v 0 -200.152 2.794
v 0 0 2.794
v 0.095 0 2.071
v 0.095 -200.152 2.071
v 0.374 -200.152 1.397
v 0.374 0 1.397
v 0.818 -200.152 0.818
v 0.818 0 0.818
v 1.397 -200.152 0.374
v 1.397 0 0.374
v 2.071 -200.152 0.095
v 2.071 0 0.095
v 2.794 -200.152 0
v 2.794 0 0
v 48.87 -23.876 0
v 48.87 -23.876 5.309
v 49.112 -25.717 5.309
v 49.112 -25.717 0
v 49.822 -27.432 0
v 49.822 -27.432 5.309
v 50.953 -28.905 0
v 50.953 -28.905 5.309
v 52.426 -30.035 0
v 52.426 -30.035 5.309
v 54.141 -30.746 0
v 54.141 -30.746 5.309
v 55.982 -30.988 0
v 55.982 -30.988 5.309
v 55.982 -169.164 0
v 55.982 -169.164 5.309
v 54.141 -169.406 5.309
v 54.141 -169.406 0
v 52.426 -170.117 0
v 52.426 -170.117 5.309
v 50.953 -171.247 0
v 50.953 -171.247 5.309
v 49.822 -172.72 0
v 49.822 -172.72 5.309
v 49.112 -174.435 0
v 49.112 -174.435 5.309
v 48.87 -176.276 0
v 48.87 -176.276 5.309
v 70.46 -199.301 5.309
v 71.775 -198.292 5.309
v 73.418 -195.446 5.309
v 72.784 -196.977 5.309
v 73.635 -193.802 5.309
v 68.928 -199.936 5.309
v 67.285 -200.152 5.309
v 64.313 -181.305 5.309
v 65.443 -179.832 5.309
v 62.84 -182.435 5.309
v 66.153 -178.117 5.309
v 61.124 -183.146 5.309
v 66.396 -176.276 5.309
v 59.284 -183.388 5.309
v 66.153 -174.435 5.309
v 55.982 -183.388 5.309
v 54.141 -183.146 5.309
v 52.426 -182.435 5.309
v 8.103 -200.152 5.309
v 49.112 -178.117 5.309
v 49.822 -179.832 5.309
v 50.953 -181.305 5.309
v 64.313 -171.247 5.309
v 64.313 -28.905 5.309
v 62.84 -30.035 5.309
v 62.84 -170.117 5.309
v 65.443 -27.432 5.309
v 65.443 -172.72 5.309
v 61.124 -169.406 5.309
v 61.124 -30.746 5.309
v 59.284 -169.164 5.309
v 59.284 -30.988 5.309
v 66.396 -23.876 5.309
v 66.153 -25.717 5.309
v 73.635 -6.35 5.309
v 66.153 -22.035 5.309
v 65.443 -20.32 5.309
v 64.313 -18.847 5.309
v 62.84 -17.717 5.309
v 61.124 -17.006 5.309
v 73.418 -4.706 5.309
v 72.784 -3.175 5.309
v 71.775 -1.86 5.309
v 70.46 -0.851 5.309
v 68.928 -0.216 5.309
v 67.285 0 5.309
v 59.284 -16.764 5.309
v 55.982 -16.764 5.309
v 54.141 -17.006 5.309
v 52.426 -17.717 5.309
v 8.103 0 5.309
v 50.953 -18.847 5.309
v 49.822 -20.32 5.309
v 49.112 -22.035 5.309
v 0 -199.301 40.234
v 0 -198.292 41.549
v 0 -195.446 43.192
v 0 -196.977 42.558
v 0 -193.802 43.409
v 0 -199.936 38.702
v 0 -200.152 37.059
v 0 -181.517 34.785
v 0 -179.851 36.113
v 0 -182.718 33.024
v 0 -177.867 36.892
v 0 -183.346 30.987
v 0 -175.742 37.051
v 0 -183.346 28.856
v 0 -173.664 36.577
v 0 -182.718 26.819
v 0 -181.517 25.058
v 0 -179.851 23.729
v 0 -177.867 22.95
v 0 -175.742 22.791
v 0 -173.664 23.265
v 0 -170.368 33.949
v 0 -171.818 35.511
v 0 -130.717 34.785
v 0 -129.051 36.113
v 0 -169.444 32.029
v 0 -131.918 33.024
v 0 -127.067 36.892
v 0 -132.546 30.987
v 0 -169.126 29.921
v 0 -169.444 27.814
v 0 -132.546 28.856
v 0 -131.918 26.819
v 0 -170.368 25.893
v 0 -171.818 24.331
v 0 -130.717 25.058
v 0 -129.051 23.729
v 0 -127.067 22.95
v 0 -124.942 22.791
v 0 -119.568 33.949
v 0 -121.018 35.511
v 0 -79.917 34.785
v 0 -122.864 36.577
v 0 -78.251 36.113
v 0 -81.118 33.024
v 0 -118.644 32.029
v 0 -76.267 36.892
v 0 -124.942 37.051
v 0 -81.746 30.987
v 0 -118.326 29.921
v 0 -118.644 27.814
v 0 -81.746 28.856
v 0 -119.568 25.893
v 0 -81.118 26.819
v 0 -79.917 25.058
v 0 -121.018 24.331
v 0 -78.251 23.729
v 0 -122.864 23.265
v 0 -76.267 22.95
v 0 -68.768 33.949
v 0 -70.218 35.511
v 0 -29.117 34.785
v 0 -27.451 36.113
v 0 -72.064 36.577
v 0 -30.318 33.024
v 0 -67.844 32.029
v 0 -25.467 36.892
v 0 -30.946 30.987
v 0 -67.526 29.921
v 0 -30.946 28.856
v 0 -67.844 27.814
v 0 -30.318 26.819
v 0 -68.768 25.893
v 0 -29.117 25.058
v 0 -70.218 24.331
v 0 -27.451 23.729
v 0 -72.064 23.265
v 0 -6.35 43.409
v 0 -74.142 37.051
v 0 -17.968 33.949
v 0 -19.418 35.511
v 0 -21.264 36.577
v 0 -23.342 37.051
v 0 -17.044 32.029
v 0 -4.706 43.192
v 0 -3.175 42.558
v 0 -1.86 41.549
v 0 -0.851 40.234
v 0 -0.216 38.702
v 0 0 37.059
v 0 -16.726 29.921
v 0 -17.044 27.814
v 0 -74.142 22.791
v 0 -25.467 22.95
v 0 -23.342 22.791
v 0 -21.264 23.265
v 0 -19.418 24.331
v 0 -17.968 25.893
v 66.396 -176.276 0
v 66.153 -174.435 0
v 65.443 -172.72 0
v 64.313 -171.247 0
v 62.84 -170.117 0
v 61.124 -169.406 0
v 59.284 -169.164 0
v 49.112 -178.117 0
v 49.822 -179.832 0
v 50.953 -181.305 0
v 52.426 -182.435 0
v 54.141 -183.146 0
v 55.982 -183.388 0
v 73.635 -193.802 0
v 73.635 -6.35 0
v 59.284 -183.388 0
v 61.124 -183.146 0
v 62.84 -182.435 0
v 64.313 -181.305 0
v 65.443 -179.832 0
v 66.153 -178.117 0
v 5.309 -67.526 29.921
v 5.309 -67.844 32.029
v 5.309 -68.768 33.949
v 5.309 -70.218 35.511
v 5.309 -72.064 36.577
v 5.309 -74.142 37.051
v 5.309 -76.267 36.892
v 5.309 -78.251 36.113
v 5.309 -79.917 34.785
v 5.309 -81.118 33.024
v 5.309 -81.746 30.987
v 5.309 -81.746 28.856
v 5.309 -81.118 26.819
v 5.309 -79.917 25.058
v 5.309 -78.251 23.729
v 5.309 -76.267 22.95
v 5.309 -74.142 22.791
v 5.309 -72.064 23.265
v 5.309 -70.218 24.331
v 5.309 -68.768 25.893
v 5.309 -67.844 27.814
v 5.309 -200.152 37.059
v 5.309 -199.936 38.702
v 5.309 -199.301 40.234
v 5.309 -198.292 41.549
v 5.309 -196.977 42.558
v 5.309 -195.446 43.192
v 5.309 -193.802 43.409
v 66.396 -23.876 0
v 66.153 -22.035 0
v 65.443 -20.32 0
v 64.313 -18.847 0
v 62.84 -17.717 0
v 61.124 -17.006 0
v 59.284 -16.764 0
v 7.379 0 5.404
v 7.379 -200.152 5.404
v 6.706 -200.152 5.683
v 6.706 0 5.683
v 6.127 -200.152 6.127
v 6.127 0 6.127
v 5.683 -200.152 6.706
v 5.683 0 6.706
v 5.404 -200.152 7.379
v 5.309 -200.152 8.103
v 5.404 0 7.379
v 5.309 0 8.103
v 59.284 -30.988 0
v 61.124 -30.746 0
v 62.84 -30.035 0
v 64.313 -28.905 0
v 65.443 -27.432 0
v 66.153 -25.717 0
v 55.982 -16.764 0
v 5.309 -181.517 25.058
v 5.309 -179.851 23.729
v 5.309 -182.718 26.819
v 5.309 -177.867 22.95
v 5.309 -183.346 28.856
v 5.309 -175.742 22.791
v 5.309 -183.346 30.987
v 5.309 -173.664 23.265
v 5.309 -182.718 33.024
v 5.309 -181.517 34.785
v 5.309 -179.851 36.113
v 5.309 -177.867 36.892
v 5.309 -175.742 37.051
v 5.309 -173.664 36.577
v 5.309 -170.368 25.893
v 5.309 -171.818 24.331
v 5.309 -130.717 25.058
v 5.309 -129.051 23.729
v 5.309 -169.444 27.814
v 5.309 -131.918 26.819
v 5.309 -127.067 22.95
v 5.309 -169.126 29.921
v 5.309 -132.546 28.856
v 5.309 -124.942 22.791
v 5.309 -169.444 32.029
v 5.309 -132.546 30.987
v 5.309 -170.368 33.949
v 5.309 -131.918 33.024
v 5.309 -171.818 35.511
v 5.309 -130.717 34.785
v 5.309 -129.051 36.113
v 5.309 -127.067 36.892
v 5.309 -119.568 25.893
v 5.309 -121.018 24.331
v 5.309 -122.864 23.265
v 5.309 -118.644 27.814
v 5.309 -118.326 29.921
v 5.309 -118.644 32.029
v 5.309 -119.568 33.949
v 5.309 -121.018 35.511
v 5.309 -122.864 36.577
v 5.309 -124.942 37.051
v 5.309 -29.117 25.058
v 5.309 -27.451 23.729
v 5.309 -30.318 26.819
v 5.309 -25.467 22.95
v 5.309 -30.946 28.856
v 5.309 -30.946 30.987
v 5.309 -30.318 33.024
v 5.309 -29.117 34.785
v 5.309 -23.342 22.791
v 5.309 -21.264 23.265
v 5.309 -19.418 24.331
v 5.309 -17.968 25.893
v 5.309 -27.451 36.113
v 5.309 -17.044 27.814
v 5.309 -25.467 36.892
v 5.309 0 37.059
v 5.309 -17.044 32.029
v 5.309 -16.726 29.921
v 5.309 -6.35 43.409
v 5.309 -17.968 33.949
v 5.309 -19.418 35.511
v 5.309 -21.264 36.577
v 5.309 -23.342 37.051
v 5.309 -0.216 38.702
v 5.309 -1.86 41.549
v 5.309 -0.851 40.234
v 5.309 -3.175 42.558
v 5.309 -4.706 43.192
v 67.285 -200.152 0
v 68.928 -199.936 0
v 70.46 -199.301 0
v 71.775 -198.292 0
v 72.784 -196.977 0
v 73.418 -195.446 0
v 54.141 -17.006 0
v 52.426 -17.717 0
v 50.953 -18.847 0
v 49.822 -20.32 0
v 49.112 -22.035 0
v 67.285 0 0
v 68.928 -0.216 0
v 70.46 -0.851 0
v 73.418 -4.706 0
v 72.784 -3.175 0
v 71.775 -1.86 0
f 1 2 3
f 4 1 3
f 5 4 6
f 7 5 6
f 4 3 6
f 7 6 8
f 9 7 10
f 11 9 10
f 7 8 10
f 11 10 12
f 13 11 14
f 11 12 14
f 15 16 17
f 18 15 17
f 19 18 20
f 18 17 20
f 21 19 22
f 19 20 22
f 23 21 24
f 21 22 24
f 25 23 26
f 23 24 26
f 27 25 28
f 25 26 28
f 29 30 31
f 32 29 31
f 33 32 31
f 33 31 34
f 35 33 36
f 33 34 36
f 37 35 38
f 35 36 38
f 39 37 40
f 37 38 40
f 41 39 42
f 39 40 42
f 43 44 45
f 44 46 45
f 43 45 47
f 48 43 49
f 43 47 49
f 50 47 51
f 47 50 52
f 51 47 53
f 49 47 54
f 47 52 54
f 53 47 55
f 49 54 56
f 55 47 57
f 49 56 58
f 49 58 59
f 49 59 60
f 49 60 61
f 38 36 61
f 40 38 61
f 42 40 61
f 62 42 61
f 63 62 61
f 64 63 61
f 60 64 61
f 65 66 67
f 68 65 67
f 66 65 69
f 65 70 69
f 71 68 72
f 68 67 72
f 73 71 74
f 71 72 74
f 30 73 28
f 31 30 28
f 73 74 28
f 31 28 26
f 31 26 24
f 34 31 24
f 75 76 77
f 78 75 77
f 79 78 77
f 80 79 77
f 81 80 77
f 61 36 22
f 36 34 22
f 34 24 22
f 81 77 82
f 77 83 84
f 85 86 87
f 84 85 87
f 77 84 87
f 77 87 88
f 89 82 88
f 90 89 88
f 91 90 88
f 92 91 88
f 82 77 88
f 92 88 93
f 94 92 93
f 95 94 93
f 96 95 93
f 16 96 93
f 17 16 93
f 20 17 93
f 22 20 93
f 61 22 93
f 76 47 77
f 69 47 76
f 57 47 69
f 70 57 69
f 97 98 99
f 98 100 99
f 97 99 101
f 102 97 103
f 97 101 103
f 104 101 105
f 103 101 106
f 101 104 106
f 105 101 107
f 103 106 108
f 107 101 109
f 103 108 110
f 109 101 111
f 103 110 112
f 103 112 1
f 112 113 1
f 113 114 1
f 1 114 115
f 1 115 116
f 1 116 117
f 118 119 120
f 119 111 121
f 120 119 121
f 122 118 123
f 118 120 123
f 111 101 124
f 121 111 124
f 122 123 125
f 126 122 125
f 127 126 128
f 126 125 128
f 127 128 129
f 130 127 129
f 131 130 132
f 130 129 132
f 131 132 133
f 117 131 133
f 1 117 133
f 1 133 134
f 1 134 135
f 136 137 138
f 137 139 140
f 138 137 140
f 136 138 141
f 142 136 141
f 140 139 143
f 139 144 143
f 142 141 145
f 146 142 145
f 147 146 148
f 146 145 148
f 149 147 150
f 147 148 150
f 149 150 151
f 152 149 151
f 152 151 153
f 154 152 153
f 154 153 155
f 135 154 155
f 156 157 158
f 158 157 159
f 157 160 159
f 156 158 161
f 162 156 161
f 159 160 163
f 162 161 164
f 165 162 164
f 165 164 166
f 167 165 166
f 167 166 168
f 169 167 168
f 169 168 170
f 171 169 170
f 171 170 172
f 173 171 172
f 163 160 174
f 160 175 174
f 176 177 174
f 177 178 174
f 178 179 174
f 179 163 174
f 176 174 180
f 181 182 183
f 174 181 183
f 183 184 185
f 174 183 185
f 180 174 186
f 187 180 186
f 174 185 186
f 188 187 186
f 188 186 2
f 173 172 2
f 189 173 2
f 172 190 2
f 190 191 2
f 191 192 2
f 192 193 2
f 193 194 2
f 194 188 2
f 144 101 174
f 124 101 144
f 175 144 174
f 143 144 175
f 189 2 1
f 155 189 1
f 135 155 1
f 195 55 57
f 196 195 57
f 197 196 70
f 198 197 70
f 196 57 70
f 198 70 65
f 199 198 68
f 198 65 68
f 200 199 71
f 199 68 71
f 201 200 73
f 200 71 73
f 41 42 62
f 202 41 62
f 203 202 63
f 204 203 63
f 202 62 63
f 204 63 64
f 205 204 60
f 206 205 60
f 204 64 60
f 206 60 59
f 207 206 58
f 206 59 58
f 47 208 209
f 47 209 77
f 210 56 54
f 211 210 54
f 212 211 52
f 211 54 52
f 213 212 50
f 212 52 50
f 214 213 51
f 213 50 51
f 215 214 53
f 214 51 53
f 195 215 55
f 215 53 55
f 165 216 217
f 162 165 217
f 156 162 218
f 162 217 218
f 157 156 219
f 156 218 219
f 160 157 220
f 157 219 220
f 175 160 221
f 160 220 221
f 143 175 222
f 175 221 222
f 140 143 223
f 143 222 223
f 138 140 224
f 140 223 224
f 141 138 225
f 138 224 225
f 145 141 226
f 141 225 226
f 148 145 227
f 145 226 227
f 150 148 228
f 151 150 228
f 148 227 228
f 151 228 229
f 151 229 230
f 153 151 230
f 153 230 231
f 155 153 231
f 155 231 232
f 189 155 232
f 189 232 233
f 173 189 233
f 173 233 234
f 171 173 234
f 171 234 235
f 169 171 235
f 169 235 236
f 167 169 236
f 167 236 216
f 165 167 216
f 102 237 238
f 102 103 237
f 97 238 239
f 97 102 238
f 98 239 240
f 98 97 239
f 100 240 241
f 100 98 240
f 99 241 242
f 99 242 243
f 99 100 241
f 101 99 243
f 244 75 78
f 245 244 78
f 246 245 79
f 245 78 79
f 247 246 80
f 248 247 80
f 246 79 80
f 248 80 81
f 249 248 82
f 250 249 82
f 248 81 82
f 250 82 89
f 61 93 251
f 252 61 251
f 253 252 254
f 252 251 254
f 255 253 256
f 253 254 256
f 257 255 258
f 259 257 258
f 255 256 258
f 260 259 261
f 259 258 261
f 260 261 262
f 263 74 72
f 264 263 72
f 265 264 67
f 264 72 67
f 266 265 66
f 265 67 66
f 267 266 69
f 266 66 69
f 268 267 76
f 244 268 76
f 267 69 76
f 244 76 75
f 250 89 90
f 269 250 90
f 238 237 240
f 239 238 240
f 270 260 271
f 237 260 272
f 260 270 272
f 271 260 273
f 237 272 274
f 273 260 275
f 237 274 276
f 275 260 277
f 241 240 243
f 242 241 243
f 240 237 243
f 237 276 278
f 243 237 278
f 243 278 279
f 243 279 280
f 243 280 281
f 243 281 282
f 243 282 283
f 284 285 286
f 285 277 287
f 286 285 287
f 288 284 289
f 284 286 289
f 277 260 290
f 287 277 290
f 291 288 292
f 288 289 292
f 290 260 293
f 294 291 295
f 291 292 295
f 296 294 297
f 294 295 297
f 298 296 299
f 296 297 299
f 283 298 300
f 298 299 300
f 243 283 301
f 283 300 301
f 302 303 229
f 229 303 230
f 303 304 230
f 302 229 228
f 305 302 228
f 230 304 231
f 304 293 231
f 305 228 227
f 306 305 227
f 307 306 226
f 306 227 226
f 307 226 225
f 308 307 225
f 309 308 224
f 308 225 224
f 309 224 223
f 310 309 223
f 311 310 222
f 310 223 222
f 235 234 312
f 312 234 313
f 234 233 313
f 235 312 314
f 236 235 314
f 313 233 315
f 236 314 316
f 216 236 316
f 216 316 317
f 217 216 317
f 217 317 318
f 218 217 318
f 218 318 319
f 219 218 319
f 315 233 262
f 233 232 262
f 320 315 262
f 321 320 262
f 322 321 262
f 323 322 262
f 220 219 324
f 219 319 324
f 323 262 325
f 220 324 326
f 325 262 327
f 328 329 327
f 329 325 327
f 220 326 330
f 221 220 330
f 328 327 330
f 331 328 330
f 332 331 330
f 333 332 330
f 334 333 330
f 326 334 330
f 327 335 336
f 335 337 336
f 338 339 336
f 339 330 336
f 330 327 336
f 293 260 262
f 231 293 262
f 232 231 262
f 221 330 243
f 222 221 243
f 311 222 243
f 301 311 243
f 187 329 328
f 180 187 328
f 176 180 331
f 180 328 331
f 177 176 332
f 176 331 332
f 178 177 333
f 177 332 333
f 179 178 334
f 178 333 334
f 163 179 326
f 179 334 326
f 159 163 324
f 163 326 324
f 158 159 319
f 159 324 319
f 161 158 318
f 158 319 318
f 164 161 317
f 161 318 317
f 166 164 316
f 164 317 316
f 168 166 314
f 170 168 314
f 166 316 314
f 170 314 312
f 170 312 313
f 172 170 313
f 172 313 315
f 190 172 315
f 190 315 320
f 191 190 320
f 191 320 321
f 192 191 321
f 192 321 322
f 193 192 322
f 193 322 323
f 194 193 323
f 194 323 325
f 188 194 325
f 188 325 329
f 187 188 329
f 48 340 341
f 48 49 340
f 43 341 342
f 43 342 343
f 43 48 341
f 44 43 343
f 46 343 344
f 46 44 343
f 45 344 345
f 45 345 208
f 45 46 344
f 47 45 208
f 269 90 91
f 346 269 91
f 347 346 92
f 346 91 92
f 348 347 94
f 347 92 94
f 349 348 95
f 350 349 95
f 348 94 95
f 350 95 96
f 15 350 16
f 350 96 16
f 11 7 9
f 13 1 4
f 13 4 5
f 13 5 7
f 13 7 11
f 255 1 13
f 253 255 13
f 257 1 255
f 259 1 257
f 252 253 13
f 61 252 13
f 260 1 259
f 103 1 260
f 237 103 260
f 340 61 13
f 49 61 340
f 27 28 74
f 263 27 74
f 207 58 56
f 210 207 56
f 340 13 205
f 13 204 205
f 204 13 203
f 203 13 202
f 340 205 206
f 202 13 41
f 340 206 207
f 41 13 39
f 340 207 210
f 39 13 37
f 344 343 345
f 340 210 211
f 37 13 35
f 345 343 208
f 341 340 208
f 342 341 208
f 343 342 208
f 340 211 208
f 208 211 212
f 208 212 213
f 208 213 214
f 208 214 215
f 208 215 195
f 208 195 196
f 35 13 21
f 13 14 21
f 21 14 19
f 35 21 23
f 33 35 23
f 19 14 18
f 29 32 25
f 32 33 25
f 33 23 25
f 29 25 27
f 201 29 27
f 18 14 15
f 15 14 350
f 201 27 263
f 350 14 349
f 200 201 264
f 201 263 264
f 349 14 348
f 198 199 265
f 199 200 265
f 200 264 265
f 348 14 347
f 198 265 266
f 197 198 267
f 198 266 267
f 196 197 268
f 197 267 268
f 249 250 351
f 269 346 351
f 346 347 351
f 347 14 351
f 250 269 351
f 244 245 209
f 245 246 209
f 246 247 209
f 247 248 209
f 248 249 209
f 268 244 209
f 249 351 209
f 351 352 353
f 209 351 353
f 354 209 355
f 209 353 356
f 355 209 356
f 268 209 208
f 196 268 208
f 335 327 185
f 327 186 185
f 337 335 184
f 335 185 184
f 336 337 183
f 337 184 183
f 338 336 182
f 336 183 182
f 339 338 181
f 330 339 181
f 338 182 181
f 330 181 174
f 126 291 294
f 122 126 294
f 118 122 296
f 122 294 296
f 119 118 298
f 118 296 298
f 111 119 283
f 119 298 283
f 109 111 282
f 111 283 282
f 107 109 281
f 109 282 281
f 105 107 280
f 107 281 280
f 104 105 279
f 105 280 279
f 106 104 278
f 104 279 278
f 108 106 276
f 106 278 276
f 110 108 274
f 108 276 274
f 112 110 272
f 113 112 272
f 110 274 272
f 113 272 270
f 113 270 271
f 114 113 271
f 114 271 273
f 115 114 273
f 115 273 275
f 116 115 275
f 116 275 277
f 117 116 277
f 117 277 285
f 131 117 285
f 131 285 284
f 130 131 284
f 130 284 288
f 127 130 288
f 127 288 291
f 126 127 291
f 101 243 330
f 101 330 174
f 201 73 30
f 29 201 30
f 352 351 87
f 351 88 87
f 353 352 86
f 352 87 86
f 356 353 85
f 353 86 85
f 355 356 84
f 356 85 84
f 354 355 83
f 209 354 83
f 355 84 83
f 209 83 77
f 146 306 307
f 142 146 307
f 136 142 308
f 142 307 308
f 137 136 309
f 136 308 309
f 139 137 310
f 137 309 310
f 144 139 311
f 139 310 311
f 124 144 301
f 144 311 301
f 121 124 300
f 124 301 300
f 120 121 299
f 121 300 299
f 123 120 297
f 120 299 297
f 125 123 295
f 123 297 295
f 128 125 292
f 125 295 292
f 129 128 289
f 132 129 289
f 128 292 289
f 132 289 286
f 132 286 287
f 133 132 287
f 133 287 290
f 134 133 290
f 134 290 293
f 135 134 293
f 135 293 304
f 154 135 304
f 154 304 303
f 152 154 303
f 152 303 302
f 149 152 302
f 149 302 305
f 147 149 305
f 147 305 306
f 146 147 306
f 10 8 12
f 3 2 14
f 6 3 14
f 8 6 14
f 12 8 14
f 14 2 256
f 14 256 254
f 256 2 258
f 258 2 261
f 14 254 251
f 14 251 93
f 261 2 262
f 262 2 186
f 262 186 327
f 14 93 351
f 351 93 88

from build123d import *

# Parameters (mm, degrees)
F1_DEPTH = 200.152
F3_D     = 14.3002
F4_R     = 6.35
F6_DEPTH = 25.4


with BuildPart() as f1:
    # F0 (on Front) → F1 (new body)
    with BuildSketch(Plane.XZ):
        with BuildLine():
            ThreePointArc((0, 2.794), (0.818344, 0.818344), (2.794, 0))
            Line((2.794, 0), (73.6346, 0))
            Line((73.6346, 0), (73.6346, 5.3086))
            Line((73.6346, 5.3086), (8.1026, 5.3086))
            ThreePointArc((8.1026, 5.3086), (6.126944, 6.126944), (5.3086, 8.1026))
            Line((5.3086, 8.1026), (5.3086, 43.4086))
            Line((5.3086, 43.4086), (0, 43.4086))
            Line((0, 43.4086), (0, 2.794))
        make_face()
    extrude(amount=F1_DEPTH)

    # F3 (through all)
    with Locations(Plane(origin=(0, 0, 0), x_dir=(0, -1, 0), z_dir=(-1, 0, 0))):
        with Locations((23.876, 29.9212), (74.676, 29.9212), (125.476, 29.9212), (176.276, 29.9212)):
            Hole(F3_D / 2)

    # F4
    f4_edges = [f1.edges().sort_by_distance(p)[0] for p in [
        (2.6543, 0, 43.4086),
        (73.6346, 0, 2.6543),
        (73.6346, -200.152, 2.6543),
        (2.6543, -200.152, 43.4086),
    ]]
    fillet(f4_edges, radius=F4_R)

    # F5 (on face) → F6 (cut)
    with BuildSketch(Plane.XY.offset(5.3086)):
        with BuildLine():
            ThreePointArc((66.3956, -23.876), (64.312543, -18.847057), (59.2836, -16.764))
            Line((59.2836, -16.764), (55.9816, -16.764))
            ThreePointArc((55.9816, -16.764), (50.952657, -18.847057), (48.8696, -23.876))
            ThreePointArc((48.8696, -23.876), (50.952657, -28.904943), (55.9816, -30.988))
            Line((55.9816, -30.988), (59.2836, -30.988))
            ThreePointArc((59.2836, -30.988), (64.312543, -28.904943), (66.3956, -23.876))
        make_face()
        with BuildLine():
            ThreePointArc((66.3956, -176.276), (64.312543, -171.247057), (59.2836, -169.164))
            Line((59.2836, -169.164), (55.9816, -169.164))
            ThreePointArc((55.9816, -169.164), (50.952657, -171.247057), (48.8696, -176.276))
            ThreePointArc((48.8696, -176.276), (50.952657, -181.304943), (55.9816, -183.388))
            Line((55.9816, -183.388), (59.2836, -183.388))
            ThreePointArc((59.2836, -183.388), (64.312543, -181.304943), (66.3956, -176.276))
        make_face()
    extrude(amount=-F6_DEPTH, mode=Mode.SUBTRACT)


solid = f1.part
